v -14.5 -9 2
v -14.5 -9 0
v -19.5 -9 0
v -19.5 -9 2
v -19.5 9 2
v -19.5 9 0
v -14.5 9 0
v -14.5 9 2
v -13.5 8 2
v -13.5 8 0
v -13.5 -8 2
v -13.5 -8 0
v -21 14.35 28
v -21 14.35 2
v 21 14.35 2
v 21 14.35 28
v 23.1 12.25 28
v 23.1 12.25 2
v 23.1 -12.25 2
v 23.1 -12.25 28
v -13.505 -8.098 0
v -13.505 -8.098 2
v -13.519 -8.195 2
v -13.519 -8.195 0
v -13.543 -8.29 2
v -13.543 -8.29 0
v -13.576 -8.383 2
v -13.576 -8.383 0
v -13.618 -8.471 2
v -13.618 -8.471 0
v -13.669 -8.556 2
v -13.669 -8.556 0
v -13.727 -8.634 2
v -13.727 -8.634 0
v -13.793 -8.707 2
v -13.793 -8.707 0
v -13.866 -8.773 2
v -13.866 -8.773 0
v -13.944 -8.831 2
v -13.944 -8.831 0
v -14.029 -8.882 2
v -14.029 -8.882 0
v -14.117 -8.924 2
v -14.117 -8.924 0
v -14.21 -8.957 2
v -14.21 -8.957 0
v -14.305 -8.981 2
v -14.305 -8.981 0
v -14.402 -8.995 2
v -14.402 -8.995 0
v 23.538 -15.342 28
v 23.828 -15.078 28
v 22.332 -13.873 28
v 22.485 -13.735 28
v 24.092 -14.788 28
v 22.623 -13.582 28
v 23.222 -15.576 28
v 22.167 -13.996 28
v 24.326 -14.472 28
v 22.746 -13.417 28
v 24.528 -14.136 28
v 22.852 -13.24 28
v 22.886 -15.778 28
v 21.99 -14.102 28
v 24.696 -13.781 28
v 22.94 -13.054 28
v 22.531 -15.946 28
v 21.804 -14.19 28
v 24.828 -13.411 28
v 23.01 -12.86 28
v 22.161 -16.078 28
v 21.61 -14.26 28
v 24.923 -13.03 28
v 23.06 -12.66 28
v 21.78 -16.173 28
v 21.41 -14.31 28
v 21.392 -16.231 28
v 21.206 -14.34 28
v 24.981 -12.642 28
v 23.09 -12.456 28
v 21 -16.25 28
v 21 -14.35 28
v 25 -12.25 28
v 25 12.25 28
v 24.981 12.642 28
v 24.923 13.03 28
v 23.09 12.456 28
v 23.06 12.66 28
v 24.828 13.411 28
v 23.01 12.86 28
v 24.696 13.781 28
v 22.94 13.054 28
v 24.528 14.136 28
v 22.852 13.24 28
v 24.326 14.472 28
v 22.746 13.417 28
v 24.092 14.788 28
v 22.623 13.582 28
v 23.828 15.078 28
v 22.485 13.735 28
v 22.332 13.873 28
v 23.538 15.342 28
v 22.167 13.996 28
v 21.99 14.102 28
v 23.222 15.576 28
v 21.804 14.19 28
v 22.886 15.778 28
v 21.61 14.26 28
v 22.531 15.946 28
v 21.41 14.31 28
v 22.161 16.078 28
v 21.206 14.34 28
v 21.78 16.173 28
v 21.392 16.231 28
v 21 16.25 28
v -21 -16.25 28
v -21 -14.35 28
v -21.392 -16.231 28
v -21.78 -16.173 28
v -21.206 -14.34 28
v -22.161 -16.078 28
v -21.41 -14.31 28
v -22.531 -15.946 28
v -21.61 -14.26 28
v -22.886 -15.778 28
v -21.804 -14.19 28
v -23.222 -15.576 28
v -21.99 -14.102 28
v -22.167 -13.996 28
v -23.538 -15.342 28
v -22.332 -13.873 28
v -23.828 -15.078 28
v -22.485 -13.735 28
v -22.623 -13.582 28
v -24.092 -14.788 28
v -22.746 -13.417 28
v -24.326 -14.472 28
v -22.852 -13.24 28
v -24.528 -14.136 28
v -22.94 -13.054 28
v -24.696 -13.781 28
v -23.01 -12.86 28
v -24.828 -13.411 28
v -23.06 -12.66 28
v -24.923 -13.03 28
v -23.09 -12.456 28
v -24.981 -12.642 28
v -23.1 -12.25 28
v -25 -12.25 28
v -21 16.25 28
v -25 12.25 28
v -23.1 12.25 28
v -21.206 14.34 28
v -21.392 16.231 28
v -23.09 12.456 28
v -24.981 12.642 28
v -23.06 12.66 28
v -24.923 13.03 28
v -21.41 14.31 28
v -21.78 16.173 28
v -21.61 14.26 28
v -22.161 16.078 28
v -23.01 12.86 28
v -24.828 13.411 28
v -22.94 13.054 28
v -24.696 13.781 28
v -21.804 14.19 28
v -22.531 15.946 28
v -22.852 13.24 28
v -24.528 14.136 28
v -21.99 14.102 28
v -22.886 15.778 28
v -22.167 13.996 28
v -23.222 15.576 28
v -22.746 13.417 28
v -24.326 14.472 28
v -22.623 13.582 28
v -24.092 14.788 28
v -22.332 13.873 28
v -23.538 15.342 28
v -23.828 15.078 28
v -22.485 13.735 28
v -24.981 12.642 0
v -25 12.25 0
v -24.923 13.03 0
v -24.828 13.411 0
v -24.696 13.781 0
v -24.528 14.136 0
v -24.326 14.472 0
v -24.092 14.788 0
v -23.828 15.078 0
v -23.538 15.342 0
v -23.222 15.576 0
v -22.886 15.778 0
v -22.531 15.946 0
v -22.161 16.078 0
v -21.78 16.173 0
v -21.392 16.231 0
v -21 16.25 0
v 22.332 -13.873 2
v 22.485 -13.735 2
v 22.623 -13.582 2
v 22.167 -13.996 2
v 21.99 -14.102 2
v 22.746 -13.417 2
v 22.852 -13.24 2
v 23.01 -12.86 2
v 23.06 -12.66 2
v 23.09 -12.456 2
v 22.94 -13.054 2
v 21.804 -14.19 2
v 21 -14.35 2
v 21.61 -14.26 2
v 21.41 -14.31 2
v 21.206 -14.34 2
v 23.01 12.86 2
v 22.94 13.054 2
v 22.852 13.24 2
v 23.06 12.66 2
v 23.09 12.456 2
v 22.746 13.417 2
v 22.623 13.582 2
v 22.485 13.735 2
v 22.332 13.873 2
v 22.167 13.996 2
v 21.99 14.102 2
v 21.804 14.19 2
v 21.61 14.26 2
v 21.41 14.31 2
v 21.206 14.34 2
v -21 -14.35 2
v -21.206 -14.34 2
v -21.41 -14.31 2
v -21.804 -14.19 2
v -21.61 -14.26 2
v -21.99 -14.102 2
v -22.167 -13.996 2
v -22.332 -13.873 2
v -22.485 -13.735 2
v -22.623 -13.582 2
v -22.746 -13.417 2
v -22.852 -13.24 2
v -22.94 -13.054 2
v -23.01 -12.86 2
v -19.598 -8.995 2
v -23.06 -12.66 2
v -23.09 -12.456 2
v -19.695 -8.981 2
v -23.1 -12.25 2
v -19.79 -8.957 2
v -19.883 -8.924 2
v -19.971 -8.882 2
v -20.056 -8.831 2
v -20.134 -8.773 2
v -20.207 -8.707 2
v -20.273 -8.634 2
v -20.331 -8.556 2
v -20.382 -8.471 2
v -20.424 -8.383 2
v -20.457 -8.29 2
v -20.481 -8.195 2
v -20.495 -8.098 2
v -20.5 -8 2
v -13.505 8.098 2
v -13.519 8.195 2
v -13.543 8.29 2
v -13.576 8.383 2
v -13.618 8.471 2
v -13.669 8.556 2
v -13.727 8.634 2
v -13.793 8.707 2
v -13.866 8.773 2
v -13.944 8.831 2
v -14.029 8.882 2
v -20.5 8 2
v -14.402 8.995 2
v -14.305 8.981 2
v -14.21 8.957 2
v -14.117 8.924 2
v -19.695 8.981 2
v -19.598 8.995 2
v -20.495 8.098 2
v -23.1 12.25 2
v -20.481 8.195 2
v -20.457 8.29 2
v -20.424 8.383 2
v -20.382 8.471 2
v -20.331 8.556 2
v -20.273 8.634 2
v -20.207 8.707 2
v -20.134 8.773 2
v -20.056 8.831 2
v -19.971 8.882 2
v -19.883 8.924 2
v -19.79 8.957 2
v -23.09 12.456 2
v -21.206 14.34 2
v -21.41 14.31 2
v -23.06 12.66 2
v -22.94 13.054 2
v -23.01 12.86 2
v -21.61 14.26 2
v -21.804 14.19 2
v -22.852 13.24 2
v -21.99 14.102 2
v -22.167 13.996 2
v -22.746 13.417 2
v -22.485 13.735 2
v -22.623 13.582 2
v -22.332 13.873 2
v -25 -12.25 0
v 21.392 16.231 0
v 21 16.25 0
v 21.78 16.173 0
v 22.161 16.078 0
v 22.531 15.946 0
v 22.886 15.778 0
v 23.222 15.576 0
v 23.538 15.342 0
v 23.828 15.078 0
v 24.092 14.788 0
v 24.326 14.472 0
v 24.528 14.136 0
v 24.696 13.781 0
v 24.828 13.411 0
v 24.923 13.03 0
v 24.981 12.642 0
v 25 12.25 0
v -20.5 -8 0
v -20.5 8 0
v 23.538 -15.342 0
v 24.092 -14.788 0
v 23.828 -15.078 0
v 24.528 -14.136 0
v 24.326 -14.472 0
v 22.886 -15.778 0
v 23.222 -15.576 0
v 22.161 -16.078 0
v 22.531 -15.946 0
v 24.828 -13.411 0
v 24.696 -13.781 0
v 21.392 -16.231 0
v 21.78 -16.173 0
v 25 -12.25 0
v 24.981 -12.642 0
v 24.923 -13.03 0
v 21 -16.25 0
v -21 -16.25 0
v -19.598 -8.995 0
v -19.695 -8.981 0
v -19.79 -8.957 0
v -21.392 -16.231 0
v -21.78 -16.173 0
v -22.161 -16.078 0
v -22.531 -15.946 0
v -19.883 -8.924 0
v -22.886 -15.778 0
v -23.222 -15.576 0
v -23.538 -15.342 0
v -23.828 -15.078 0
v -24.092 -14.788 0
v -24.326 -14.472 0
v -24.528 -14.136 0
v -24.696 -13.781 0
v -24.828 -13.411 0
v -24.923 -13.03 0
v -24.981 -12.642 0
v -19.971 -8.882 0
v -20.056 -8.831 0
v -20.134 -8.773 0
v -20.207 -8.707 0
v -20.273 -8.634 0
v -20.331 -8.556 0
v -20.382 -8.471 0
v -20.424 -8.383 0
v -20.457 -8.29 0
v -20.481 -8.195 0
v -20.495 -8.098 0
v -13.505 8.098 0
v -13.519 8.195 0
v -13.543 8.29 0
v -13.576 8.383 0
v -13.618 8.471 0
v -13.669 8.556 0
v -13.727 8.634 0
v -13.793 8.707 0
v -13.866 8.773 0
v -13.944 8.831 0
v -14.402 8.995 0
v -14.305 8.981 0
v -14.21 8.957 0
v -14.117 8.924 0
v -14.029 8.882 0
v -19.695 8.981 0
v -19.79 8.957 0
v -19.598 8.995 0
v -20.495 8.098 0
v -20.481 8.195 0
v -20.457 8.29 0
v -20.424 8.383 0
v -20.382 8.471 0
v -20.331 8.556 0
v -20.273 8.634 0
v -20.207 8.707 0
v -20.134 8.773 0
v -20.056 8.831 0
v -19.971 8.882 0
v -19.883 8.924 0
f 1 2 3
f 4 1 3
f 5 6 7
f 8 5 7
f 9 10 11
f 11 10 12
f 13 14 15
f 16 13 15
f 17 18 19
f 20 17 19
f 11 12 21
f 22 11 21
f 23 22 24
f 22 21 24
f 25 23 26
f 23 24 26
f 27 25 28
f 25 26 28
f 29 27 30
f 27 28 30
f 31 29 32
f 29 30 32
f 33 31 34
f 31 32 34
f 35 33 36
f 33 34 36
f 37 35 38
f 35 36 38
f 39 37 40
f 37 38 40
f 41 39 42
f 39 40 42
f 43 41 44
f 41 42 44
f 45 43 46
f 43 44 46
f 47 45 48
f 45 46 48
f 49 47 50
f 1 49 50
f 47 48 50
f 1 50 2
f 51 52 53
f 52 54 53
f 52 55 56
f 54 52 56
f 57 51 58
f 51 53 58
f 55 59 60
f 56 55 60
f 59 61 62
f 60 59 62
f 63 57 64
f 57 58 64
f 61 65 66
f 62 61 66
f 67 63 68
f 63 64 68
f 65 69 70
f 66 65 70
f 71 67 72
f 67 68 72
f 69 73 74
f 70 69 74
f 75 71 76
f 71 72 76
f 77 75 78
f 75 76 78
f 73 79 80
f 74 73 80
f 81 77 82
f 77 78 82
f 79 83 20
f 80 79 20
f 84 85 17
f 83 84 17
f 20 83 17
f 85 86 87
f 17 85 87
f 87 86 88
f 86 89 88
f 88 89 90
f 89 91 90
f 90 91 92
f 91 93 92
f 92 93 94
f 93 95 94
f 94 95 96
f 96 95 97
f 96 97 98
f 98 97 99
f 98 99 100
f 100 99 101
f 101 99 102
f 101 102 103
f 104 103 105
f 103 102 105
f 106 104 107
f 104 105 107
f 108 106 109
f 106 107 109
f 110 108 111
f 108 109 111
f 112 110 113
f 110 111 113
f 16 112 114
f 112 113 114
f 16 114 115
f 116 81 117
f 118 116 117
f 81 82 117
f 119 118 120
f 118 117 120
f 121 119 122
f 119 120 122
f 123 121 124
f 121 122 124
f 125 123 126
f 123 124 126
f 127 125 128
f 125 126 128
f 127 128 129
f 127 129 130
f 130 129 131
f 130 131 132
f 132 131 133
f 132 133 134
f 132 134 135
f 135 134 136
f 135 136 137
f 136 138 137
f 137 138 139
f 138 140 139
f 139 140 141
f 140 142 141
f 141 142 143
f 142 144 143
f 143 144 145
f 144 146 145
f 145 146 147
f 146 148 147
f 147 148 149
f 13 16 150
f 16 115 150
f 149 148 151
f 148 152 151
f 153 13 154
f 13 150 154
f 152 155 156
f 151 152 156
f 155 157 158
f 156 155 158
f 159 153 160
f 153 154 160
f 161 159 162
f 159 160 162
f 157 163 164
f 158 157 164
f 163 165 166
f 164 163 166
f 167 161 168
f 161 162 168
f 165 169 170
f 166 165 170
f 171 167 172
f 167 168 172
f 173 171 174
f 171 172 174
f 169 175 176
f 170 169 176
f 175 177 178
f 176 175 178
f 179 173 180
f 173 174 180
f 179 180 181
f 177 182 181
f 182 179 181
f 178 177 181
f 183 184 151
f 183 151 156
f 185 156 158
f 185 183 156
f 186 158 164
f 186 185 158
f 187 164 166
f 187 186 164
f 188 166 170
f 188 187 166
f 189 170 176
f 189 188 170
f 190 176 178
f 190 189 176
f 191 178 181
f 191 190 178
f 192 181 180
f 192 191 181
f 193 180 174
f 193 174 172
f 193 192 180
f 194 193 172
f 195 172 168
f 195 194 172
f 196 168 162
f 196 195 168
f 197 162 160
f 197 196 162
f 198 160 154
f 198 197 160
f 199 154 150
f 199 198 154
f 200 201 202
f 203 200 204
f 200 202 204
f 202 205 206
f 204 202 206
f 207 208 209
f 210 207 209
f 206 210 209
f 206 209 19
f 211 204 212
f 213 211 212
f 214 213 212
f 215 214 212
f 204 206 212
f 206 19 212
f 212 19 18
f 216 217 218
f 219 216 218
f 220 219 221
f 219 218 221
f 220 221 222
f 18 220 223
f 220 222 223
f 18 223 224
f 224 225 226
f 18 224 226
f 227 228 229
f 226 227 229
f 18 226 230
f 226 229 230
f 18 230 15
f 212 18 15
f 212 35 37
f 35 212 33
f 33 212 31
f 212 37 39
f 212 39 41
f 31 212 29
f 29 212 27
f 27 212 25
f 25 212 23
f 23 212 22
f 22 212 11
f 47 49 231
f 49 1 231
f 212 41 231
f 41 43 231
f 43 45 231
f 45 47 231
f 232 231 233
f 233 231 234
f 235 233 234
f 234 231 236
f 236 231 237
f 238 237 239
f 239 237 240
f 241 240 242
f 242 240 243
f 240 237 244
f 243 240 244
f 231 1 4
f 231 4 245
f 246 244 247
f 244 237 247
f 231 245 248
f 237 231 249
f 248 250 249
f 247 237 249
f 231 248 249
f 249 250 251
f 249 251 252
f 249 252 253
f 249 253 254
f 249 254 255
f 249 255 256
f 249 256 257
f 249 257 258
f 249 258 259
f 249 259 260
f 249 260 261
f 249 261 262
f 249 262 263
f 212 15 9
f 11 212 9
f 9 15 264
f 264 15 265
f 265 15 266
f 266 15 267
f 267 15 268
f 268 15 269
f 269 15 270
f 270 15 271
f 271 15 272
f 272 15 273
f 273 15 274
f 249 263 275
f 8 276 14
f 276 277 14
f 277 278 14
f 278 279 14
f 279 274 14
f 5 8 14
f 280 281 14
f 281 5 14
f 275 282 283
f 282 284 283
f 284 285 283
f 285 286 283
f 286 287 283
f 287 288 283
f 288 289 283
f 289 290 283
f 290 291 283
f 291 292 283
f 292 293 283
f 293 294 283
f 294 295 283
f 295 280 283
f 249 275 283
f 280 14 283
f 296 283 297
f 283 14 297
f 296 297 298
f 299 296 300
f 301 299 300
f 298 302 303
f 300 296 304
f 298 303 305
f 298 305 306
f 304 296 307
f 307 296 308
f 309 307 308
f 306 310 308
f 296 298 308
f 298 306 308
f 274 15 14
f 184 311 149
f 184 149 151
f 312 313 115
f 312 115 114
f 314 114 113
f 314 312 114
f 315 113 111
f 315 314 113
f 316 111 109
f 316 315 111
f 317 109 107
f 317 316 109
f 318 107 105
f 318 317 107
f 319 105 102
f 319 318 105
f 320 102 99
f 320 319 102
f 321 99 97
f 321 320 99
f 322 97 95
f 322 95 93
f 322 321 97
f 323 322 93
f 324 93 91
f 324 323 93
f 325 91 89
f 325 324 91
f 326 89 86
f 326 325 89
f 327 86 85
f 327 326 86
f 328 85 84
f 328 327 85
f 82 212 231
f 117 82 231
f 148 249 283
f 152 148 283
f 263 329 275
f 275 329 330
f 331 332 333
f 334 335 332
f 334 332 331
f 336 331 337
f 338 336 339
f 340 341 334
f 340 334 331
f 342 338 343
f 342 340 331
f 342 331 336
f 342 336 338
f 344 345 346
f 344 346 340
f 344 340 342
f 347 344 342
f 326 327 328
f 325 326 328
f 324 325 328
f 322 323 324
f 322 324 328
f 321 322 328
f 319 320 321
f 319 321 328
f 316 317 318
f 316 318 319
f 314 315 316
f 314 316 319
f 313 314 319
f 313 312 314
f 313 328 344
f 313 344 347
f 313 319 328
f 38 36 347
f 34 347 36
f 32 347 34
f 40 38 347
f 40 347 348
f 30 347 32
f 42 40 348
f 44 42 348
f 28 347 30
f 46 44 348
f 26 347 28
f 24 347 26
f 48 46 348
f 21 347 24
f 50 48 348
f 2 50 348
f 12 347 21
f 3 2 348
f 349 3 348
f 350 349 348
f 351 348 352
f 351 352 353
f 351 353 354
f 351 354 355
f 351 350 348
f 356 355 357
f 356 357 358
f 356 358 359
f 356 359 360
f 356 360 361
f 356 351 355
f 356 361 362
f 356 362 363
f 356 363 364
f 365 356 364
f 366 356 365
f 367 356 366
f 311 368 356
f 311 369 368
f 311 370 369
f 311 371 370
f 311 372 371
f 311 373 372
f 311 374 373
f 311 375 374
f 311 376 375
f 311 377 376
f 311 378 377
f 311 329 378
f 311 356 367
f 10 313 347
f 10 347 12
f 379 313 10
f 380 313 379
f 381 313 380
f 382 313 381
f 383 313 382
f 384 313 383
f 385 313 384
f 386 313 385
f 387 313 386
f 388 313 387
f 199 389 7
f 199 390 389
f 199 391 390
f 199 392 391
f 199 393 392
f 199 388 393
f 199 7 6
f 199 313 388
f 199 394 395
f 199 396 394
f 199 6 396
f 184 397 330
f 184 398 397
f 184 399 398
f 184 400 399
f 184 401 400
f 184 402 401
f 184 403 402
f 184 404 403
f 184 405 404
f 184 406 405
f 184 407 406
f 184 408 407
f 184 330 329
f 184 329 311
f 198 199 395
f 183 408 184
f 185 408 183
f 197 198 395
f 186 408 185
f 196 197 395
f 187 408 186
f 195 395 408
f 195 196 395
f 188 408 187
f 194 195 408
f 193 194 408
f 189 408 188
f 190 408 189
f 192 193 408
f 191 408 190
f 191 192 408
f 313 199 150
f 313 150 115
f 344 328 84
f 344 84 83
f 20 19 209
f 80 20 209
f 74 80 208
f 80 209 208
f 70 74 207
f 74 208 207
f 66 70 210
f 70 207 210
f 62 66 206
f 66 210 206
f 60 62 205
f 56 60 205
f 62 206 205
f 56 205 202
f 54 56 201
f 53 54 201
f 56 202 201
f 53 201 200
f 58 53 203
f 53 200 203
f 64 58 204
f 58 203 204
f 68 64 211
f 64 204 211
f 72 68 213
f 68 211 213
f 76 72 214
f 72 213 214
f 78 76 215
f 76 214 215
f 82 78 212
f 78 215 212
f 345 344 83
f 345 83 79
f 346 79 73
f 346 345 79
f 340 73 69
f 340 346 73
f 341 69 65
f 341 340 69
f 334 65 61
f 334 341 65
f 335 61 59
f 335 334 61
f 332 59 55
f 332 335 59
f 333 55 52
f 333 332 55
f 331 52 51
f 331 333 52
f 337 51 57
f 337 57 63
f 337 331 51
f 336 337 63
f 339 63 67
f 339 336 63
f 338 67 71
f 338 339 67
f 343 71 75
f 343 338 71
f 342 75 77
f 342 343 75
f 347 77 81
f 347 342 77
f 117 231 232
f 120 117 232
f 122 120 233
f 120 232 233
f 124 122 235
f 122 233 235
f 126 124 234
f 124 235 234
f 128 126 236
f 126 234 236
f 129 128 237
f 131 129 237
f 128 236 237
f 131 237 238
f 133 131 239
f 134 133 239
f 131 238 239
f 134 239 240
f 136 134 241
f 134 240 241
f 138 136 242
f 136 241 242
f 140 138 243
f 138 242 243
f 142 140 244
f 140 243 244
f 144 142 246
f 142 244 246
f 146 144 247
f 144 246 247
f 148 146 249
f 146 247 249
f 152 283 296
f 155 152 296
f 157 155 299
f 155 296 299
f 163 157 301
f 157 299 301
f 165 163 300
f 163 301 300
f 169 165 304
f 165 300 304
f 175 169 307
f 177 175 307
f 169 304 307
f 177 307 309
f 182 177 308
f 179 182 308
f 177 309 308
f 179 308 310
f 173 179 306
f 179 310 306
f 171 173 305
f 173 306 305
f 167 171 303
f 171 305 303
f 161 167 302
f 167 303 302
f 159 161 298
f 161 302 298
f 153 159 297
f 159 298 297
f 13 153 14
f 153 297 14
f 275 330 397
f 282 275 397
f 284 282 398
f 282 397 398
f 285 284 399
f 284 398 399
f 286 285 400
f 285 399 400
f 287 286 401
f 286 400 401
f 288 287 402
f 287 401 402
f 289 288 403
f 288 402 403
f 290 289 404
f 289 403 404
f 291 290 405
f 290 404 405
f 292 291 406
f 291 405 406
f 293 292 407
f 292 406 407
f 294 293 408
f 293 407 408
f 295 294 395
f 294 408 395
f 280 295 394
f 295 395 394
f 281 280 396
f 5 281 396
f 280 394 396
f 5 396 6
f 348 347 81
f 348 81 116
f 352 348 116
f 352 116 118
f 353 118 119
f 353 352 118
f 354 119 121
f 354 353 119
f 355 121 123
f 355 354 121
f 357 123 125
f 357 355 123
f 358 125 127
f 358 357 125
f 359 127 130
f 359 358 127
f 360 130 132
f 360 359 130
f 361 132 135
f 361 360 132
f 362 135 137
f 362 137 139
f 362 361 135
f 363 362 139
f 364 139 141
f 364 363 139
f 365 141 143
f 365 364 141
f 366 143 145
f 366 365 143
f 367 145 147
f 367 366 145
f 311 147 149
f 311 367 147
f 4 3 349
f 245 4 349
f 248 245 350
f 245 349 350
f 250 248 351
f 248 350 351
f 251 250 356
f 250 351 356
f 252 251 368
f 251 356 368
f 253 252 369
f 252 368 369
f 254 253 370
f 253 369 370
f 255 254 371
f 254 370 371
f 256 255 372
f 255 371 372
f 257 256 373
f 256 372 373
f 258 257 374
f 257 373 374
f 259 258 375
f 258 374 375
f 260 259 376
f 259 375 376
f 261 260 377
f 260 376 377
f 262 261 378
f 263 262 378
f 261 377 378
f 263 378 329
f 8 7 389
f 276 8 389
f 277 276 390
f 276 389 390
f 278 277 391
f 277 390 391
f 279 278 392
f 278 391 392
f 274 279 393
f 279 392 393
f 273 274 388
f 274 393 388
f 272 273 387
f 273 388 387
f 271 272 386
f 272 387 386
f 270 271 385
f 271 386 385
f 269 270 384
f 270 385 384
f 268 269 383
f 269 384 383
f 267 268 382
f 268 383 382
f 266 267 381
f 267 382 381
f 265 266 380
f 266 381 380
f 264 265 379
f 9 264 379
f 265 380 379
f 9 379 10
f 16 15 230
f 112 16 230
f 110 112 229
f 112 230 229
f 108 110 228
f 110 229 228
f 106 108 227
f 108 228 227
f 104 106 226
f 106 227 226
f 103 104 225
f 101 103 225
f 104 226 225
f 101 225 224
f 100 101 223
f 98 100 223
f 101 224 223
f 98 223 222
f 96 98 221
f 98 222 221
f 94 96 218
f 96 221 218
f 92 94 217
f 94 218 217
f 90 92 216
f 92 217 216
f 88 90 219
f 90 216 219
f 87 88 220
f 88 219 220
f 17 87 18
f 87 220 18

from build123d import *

# Parameters (mm, degrees)
BOSS_EXTRUDE1_DEPTH = 28
BOSS_EXTRUDE2_DEPTH = 2


with BuildPart() as part:
    # Sketch1 → Boss-Extrude1 (new body)
    with BuildSketch(Plane.XY):
        with BuildLine():
            ThreePointArc((-25, -12.25), (-23.828427125, -15.078427125), (-21, -16.25))
            Line((-21, -16.25), (21, -16.25))
            ThreePointArc((21, -16.25), (23.828427125, -15.078427125), (25, -12.25))
            Line((25, -12.25), (25, 12.25))
            ThreePointArc((25, 12.25), (23.828427125, 15.078427125), (21, 16.25))
            Line((21, 16.25), (-21, 16.25))
            ThreePointArc((-21, 16.25), (-23.828427125, 15.078427125), (-25, 12.25))
            Line((-25, 12.25), (-25, -12.25))
        make_face()
        with BuildLine():
            ThreePointArc((-23.1, 12.25), (-22.48492424, 13.73492424), (-21, 14.35))
            Line((-21, 14.35), (21, 14.35))
            ThreePointArc((21, 14.35), (22.48492424, 13.73492424), (23.1, 12.25))
            Line((23.1, 12.25), (23.1, -12.25))
            ThreePointArc((23.1, -12.25), (22.48492424, -13.73492424), (21, -14.35))
            Line((21, -14.35), (-21, -14.35))
            ThreePointArc((-21, -14.35), (-22.48492424, -13.73492424), (-23.1, -12.25))
            Line((-23.1, -12.25), (-23.1, 12.25))
        make_face(mode=Mode.SUBTRACT)
    extrude(amount=BOSS_EXTRUDE1_DEPTH)

    # Sketch1<3> → Boss-Extrude2 (add)
    with BuildSketch(Plane.XY):
        with BuildLine():
            Line((21, 14.35), (-21, 14.35))
            ThreePointArc((-21, 14.35), (-22.48492424, 13.73492424), (-23.1, 12.25))
            Line((-23.1, 12.25), (-23.1, -12.25))
            ThreePointArc((-23.1, -12.25), (-22.48492424, -13.73492424), (-21, -14.35))
            Line((-21, -14.35), (21, -14.35))
            ThreePointArc((21, -14.35), (22.48492424, -13.73492424), (23.1, -12.25))
            Line((23.1, -12.25), (23.1, 12.25))
            ThreePointArc((23.1, 12.25), (22.48492424, 13.73492424), (21, 14.35))
        make_face()
        with BuildLine():
            Line((-14.5, -9), (-19.5, -9))
            ThreePointArc((-19.5, -9), (-20.207106781, -8.707106781), (-20.5, -8))
            Line((-20.5, -8), (-20.5, 8))
            ThreePointArc((-20.5, 8), (-20.207106781, 8.707106781), (-19.5, 9))
            Line((-19.5, 9), (-14.5, 9))
            ThreePointArc((-14.5, 9), (-13.792893219, 8.707106781), (-13.5, 8))
            Line((-13.5, 8), (-13.5, -8))
            ThreePointArc((-13.5, -8), (-13.792893219, -8.707106781), (-14.5, -9))
        make_face(mode=Mode.SUBTRACT)
    extrude(amount=BOSS_EXTRUDE2_DEPTH)


solid = part.part
